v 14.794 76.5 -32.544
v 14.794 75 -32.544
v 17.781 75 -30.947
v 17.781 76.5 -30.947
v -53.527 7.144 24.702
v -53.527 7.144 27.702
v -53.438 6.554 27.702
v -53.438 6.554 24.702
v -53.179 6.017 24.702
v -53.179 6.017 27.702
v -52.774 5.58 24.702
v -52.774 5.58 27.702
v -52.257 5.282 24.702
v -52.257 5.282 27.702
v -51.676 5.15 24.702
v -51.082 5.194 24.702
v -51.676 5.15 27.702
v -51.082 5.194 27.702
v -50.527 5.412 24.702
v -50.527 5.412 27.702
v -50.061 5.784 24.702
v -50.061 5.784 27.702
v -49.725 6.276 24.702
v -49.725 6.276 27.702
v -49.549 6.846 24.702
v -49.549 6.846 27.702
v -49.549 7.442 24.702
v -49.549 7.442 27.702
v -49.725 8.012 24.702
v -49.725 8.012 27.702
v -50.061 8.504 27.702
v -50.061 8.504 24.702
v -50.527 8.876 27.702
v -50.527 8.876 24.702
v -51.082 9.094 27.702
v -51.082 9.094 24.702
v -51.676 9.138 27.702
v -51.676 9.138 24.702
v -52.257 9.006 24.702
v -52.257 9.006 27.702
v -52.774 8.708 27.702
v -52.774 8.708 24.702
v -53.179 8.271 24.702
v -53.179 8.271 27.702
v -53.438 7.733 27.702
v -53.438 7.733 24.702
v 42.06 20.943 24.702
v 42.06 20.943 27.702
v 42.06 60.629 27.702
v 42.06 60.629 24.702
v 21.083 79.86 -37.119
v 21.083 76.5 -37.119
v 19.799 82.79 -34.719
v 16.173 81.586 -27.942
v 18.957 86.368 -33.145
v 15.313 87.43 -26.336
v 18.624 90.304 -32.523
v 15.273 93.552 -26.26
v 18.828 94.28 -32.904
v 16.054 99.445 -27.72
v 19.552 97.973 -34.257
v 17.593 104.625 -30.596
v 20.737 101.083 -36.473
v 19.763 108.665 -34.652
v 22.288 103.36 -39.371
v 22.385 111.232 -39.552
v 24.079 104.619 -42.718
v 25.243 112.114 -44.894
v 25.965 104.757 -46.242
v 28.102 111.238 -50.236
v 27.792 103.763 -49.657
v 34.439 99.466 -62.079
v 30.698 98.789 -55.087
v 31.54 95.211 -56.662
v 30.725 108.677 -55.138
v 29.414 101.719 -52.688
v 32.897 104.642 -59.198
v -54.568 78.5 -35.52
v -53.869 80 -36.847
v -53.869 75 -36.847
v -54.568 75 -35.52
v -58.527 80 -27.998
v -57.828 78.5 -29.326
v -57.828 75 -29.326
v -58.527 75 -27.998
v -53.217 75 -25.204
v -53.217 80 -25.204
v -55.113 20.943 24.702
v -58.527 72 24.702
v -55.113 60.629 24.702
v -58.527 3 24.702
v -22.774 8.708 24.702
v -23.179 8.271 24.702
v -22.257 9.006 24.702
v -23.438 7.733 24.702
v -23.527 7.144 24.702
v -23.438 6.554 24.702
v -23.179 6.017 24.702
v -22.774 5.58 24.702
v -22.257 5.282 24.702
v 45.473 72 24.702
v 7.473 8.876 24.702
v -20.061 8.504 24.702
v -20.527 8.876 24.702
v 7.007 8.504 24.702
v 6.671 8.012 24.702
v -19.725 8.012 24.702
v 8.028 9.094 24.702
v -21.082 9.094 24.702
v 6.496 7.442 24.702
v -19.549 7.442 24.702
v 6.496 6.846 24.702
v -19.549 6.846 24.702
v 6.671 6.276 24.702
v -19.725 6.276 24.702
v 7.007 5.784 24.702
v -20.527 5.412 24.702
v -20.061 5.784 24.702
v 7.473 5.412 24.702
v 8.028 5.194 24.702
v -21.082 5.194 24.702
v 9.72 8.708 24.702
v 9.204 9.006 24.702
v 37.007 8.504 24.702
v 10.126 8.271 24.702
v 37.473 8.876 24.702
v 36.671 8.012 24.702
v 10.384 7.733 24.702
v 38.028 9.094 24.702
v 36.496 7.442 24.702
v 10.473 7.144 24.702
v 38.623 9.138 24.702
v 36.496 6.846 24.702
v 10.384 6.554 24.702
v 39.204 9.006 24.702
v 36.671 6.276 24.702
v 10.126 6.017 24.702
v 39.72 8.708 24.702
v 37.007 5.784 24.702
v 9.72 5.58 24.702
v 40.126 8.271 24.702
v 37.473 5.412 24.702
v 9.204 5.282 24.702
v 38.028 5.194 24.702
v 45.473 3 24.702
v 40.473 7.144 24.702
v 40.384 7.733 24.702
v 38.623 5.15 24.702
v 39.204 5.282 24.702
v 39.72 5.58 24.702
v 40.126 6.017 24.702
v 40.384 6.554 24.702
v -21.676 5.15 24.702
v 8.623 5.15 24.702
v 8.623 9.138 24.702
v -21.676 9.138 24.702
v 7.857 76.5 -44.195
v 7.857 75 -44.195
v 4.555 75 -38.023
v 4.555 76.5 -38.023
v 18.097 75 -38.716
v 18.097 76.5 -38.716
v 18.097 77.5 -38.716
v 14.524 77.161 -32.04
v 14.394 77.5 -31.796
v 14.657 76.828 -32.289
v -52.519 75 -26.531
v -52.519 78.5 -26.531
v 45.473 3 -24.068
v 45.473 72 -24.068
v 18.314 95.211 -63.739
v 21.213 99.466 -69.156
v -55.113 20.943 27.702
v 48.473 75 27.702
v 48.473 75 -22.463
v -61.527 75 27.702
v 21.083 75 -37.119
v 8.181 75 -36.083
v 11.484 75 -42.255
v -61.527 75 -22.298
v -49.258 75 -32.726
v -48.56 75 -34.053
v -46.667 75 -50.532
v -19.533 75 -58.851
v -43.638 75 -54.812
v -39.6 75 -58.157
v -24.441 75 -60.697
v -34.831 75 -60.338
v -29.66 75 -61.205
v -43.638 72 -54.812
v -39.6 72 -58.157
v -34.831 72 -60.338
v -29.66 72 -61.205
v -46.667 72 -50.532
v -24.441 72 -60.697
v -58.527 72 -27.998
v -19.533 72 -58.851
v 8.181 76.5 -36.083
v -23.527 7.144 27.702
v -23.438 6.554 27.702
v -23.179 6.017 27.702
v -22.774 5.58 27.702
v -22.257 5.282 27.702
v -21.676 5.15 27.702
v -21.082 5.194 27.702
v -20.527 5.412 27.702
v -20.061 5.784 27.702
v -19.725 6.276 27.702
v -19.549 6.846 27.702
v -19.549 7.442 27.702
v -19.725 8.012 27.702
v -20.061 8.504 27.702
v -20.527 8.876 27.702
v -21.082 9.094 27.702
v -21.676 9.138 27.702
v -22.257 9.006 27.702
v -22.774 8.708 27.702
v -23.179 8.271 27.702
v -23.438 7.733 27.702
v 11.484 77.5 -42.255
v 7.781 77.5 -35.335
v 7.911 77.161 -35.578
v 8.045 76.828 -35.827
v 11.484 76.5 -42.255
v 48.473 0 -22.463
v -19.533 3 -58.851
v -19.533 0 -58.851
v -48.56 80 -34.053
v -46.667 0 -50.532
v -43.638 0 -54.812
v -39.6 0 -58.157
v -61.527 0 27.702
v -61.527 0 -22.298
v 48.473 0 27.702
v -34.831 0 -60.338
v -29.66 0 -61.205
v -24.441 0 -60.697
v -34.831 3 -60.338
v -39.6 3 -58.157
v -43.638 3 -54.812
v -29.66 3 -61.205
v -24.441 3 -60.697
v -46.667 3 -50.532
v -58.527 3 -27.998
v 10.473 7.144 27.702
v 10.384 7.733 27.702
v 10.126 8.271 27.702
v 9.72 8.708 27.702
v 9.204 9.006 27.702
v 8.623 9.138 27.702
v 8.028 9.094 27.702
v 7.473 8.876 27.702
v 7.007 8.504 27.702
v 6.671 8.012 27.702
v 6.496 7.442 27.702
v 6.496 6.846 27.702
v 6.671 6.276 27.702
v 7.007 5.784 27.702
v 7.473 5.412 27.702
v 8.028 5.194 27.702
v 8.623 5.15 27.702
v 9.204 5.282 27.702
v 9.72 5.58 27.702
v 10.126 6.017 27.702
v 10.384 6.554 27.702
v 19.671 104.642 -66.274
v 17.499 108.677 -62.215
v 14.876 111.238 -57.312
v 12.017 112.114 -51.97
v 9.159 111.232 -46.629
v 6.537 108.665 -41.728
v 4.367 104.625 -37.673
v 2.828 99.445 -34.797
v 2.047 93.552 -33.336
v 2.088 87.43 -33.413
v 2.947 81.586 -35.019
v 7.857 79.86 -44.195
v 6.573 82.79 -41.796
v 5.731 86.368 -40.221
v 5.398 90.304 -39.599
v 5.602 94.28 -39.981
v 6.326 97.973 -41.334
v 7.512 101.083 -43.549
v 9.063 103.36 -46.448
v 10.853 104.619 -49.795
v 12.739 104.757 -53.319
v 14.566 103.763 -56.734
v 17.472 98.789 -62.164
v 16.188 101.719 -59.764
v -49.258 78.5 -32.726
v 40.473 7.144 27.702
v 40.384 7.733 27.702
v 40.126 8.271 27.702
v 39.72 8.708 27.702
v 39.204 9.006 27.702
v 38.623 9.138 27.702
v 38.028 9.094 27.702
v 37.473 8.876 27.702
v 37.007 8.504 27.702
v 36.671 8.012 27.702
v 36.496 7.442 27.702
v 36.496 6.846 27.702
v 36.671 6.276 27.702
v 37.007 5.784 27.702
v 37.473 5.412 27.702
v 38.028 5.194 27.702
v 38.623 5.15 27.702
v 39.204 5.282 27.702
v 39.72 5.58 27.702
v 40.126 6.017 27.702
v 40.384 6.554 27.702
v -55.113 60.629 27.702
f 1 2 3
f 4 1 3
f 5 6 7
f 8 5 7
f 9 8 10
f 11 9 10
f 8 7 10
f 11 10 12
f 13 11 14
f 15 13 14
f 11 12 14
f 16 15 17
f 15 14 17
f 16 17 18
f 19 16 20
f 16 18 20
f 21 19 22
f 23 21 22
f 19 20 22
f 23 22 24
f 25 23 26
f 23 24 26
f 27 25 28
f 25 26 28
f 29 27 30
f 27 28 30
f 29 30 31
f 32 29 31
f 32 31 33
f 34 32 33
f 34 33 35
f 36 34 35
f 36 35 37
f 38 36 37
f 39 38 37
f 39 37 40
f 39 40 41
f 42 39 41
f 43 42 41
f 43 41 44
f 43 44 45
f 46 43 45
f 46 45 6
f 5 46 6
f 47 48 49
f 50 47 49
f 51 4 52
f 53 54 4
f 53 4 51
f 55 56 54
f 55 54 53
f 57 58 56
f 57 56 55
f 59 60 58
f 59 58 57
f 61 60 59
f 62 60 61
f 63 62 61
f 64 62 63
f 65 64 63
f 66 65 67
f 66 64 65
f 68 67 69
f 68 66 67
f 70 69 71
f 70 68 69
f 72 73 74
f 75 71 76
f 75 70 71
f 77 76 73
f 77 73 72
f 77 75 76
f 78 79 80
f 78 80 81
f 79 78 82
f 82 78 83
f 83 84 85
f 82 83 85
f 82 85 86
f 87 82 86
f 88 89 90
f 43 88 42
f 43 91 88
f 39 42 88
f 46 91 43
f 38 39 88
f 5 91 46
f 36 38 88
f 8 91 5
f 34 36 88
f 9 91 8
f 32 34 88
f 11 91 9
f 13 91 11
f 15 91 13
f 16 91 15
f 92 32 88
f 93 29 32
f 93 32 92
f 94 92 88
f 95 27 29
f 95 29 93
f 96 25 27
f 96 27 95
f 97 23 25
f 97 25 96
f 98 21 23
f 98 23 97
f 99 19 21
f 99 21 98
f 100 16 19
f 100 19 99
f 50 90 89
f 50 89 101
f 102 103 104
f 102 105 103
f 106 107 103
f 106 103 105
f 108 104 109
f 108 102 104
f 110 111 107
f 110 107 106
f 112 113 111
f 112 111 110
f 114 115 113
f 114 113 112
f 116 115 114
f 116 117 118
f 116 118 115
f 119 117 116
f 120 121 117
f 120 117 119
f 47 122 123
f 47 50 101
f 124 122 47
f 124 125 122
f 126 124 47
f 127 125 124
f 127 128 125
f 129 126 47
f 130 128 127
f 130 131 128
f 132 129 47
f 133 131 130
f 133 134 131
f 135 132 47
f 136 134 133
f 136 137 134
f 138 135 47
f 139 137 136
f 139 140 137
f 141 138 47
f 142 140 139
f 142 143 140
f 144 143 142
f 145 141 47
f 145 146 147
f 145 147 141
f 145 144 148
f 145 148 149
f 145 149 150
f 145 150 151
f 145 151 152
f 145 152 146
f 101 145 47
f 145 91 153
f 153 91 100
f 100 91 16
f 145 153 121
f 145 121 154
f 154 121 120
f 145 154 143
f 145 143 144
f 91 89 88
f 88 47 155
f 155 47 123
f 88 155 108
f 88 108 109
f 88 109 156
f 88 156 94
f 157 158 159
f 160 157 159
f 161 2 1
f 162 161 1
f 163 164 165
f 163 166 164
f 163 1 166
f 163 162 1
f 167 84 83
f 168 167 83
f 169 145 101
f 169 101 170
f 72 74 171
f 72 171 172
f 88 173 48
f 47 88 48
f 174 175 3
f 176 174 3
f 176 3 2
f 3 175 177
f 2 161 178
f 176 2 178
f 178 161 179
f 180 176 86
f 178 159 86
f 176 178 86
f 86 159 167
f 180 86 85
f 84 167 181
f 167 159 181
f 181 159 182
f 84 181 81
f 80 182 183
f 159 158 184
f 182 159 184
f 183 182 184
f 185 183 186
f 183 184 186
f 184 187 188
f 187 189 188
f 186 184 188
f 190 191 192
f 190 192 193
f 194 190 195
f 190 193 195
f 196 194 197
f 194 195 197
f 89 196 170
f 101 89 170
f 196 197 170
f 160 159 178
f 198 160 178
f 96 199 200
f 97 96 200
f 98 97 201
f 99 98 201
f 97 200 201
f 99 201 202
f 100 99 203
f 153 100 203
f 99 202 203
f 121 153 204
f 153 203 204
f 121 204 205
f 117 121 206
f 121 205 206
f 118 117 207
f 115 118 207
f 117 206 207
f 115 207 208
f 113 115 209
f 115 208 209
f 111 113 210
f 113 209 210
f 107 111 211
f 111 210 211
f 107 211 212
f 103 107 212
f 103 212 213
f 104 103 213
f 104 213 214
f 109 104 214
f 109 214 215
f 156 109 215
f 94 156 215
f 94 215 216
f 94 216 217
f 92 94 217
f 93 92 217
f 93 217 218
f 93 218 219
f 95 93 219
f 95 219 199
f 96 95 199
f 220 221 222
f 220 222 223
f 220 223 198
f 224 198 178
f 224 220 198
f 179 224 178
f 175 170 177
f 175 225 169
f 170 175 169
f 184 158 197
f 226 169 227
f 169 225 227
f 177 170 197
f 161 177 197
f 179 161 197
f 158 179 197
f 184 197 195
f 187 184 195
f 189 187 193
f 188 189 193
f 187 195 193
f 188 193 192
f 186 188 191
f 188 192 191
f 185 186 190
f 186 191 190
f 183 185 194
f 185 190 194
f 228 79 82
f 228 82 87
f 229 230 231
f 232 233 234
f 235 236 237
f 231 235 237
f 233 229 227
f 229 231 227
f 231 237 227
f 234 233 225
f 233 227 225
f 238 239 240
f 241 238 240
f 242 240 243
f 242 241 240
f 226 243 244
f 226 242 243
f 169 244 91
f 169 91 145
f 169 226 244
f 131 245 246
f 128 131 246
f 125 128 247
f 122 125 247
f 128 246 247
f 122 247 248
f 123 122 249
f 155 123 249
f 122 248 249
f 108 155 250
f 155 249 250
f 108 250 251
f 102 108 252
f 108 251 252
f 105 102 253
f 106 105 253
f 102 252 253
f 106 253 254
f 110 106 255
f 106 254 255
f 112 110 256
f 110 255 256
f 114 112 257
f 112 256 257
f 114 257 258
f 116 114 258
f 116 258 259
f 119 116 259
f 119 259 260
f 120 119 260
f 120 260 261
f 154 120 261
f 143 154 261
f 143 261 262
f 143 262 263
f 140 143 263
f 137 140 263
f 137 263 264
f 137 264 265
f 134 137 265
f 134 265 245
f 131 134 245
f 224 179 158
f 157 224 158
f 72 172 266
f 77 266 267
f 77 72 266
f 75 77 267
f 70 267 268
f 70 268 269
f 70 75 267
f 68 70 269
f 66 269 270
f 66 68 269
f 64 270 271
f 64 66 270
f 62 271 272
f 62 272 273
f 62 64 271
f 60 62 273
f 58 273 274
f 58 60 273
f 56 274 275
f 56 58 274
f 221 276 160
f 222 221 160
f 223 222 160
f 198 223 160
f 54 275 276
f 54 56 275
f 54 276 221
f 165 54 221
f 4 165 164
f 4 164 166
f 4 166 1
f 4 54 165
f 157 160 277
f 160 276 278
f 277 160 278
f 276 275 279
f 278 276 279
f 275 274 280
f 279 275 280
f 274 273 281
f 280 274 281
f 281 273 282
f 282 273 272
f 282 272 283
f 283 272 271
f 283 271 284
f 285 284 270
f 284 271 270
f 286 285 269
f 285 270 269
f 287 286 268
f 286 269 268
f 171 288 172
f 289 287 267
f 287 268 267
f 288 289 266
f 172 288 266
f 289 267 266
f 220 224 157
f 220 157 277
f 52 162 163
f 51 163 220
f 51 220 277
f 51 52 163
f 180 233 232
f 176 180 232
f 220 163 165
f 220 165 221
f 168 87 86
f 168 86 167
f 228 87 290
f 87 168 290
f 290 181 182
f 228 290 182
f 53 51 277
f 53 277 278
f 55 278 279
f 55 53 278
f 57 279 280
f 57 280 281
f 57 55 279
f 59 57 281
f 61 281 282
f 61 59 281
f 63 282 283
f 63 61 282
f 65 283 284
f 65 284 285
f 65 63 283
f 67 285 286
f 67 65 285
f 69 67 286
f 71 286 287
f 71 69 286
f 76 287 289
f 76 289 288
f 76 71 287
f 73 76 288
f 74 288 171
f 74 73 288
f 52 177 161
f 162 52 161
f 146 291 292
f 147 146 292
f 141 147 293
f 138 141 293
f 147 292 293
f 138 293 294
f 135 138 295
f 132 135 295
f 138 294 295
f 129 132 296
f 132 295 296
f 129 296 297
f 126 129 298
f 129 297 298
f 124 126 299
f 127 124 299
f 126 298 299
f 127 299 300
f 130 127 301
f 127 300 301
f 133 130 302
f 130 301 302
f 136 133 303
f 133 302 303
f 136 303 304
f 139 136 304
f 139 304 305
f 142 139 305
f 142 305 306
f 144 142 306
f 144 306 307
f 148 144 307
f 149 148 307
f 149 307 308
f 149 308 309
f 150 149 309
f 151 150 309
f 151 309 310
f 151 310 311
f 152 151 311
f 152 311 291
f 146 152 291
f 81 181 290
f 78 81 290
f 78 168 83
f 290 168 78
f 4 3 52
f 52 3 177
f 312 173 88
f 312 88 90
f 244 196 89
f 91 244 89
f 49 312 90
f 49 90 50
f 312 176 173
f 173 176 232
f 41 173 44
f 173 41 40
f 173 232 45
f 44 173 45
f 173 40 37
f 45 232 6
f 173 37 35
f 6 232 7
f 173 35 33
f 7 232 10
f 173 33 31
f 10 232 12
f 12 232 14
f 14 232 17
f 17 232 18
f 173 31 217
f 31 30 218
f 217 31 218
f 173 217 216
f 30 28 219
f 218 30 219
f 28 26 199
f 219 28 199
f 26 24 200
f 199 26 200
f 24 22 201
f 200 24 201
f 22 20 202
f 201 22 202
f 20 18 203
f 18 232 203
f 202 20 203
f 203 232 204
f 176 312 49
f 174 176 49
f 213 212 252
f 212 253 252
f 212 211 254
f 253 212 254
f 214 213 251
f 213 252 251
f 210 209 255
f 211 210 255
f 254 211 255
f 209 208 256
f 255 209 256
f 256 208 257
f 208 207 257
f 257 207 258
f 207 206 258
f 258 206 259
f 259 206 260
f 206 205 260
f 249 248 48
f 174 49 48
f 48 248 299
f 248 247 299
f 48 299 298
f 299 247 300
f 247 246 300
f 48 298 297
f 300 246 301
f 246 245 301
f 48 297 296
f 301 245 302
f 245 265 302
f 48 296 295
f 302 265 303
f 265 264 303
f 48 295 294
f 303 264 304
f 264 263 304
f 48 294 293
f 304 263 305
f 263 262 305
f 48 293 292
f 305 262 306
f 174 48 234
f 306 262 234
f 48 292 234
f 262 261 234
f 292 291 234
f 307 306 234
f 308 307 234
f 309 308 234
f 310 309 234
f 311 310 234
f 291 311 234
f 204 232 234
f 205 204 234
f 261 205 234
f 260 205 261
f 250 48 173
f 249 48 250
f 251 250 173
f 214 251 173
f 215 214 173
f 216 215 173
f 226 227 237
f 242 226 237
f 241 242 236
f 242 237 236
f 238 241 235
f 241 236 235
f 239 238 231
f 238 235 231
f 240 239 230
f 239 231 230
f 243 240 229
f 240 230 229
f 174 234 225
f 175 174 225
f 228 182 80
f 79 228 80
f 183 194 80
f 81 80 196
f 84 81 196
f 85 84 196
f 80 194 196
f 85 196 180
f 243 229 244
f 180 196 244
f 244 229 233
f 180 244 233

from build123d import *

# Parameters (mm, degrees)
RESSALTO_EXTRUS_O4_DEPTH  = 75
CASCA4_T                  = -3
ESBO_O13_R                = 2
ESBO_O13_W                = 97.172868657
ESBO_O13_H                = 39.686100031
CORTE_EXTRUS_O2_DEPTH     = 75
RESSALTO_EXTRUS_O7_DEPTH  = 5
ESBO_O21_W                = 7
ESBO_O21_H                = 3.5
CORTE_EXTRUS_O7_DEPTH     = 15
RESSALTO_EXTRUS_O9_DEPTH  = 1.5
RESSALTO_EXTRUS_O10_DEPTH = 15
CORTE_EXTRUS_O8_DEPTH     = 9


with BuildPart() as part:
    # Esboço1 → Ressalto-extrusão4 (new body)
    with BuildSketch(Plane(origin=(0, 0, 0), x_dir=(1, 0, 0), z_dir=(0, 1, 0))):
        with BuildLine():
            Line((-61.526708671, 22.298270257), (-61.526708671, -27.701729743))
            Line((-61.526708671, -27.701729743), (48.473291329, -27.701729743))
            Line((48.473291329, -27.701729743), (48.473291329, 22.462720238))
            Line((48.473291329, 22.462720238), (-19.533044421, 58.851024019))
            ThreePointArc((-19.533044421, 58.851024019), (-34.831371888, 60.338136116), (-46.667038922, 50.53164278))
            Line((-46.667038922, 50.53164278), (-61.526708671, 22.298270257))
        make_face()
    extrude(amount=RESSALTO_EXTRUS_O4_DEPTH)

    # Casca4
    casca4_openings = [part.faces().sort_by_distance(p)[0] for p in [
        (-34.831371888, 37.5, -60.338136116),
        (14.470123454, 37.5, -40.656872128),
        (-54.096873797, 37.5, -36.414956518),
    ]]
    offset(amount=CASCA4_T, openings=casca4_openings, kind=Kind.INTERSECTION)

    # Esboço13 → Corte-extrusão2 (cut)
    with BuildSketch(Plane.XY.offset(27.701729743)):
        with Locations((8.473291329, 7.143908188)):
            Circle(ESBO_O13_R)
        with Locations((38.473291329, 7.143908188)):
            Circle(ESBO_O13_R)
        with Locations(Location((-51.526708671, 7.143908188, 0), (0, 0, 180))):
            Circle(ESBO_O13_R)
        with Locations(Location((-21.526708671, 7.143908188, 0), (0, 0, 180))):
            Circle(ESBO_O13_R)
        with Locations((-6.526708671, 40.786037138)):
            Rectangle(ESBO_O13_W, ESBO_O13_H)
    extrude(amount=-CORTE_EXTRUS_O2_DEPTH, mode=Mode.SUBTRACT)

    # Esboço20 → Ressalto-extrusão7 (add)
    with BuildSketch(Plane(origin=(0, 75, 0), x_dir=(1, 0, 0), z_dir=(0, 1, 0))):
        Polygon((-48.559735009, 34.052973883), (-53.869244343, 36.84745248), (-58.526708671, 27.998270257), (-53.217199337, 25.20379166), align=None)
    extrude(amount=RESSALTO_EXTRUS_O7_DEPTH)

    # Esboço21 → Corte-extrusão7 (cut)
    with BuildSketch(Plane(origin=(-52.061018169, 0, -27.400535878), x_dir=(0.46574643283262207, 0, -0.8849182223819825), z_dir=(0.8849182223819825, 0, 0.46574643283262207))):
        with Locations((2.517573756, 76.75)):
            Rectangle(ESBO_O21_W, ESBO_O21_H)
    extrude(amount=-CORTE_EXTRUS_O7_DEPTH, mode=Mode.SUBTRACT)

    # Esboço23 → Ressalto-extrusão9 (add)
    with BuildSketch(Plane(origin=(0, 75, 0), x_dir=(1, 0, 0), z_dir=(0, 1, 0))):
        Polygon((17.78051848, 30.946502751), (21.082988999, 37.118511214), (14.470123454, 40.656872128), (7.857257909, 44.195233042), (4.55478739, 38.023224579), align=None)
    extrude(amount=RESSALTO_EXTRUS_O9_DEPTH)

    # Esboço27 → Ressalto-extrusão10 (add)
    with BuildSketch(Plane(origin=(0.949934773, 0, 0.508283746), x_dir=(0.4717815026852956, 0, -0.8817154947736852), z_dir=(0.8817154947736852, 0, 0.4717815026852957))):
        with BuildLine():
            Line((42.674530712, 76.5), (42.674530712, 79.859907211))
            ThreePointArc((42.674530712, 79.859907211), (43.504490054, 102.339384634), (64.83991575, 95.21089615))
            Line((64.83991575, 95.21089615), (70.983567604, 99.465779677))
            ThreePointArc((70.983567604, 99.465779677), (39.876872471, 108.665113983), (35.674530712, 76.5))
            Line((35.674530712, 76.5), (42.674530712, 76.5))
        make_face()
    extrude(amount=-RESSALTO_EXTRUS_O10_DEPTH)

    # Esboço28 → Corte-extrusão8 (cut)
    with BuildSketch(Plane(origin=(20.133054226, 0, -37.626794961), x_dir=(-0.8817154947736852, 0, -0.4717815026852955), z_dir=(0.4717815026852955, 0, -0.8817154947736852))):
        Polygon((2.309694071, 75), (2.309694071, 77.5), (9.809694071, 77.5), (9.809694071, 75), (6.059694071, 75), align=None)
    extrude(amount=-CORTE_EXTRUS_O8_DEPTH, mode=Mode.SUBTRACT)


solid = part.part
